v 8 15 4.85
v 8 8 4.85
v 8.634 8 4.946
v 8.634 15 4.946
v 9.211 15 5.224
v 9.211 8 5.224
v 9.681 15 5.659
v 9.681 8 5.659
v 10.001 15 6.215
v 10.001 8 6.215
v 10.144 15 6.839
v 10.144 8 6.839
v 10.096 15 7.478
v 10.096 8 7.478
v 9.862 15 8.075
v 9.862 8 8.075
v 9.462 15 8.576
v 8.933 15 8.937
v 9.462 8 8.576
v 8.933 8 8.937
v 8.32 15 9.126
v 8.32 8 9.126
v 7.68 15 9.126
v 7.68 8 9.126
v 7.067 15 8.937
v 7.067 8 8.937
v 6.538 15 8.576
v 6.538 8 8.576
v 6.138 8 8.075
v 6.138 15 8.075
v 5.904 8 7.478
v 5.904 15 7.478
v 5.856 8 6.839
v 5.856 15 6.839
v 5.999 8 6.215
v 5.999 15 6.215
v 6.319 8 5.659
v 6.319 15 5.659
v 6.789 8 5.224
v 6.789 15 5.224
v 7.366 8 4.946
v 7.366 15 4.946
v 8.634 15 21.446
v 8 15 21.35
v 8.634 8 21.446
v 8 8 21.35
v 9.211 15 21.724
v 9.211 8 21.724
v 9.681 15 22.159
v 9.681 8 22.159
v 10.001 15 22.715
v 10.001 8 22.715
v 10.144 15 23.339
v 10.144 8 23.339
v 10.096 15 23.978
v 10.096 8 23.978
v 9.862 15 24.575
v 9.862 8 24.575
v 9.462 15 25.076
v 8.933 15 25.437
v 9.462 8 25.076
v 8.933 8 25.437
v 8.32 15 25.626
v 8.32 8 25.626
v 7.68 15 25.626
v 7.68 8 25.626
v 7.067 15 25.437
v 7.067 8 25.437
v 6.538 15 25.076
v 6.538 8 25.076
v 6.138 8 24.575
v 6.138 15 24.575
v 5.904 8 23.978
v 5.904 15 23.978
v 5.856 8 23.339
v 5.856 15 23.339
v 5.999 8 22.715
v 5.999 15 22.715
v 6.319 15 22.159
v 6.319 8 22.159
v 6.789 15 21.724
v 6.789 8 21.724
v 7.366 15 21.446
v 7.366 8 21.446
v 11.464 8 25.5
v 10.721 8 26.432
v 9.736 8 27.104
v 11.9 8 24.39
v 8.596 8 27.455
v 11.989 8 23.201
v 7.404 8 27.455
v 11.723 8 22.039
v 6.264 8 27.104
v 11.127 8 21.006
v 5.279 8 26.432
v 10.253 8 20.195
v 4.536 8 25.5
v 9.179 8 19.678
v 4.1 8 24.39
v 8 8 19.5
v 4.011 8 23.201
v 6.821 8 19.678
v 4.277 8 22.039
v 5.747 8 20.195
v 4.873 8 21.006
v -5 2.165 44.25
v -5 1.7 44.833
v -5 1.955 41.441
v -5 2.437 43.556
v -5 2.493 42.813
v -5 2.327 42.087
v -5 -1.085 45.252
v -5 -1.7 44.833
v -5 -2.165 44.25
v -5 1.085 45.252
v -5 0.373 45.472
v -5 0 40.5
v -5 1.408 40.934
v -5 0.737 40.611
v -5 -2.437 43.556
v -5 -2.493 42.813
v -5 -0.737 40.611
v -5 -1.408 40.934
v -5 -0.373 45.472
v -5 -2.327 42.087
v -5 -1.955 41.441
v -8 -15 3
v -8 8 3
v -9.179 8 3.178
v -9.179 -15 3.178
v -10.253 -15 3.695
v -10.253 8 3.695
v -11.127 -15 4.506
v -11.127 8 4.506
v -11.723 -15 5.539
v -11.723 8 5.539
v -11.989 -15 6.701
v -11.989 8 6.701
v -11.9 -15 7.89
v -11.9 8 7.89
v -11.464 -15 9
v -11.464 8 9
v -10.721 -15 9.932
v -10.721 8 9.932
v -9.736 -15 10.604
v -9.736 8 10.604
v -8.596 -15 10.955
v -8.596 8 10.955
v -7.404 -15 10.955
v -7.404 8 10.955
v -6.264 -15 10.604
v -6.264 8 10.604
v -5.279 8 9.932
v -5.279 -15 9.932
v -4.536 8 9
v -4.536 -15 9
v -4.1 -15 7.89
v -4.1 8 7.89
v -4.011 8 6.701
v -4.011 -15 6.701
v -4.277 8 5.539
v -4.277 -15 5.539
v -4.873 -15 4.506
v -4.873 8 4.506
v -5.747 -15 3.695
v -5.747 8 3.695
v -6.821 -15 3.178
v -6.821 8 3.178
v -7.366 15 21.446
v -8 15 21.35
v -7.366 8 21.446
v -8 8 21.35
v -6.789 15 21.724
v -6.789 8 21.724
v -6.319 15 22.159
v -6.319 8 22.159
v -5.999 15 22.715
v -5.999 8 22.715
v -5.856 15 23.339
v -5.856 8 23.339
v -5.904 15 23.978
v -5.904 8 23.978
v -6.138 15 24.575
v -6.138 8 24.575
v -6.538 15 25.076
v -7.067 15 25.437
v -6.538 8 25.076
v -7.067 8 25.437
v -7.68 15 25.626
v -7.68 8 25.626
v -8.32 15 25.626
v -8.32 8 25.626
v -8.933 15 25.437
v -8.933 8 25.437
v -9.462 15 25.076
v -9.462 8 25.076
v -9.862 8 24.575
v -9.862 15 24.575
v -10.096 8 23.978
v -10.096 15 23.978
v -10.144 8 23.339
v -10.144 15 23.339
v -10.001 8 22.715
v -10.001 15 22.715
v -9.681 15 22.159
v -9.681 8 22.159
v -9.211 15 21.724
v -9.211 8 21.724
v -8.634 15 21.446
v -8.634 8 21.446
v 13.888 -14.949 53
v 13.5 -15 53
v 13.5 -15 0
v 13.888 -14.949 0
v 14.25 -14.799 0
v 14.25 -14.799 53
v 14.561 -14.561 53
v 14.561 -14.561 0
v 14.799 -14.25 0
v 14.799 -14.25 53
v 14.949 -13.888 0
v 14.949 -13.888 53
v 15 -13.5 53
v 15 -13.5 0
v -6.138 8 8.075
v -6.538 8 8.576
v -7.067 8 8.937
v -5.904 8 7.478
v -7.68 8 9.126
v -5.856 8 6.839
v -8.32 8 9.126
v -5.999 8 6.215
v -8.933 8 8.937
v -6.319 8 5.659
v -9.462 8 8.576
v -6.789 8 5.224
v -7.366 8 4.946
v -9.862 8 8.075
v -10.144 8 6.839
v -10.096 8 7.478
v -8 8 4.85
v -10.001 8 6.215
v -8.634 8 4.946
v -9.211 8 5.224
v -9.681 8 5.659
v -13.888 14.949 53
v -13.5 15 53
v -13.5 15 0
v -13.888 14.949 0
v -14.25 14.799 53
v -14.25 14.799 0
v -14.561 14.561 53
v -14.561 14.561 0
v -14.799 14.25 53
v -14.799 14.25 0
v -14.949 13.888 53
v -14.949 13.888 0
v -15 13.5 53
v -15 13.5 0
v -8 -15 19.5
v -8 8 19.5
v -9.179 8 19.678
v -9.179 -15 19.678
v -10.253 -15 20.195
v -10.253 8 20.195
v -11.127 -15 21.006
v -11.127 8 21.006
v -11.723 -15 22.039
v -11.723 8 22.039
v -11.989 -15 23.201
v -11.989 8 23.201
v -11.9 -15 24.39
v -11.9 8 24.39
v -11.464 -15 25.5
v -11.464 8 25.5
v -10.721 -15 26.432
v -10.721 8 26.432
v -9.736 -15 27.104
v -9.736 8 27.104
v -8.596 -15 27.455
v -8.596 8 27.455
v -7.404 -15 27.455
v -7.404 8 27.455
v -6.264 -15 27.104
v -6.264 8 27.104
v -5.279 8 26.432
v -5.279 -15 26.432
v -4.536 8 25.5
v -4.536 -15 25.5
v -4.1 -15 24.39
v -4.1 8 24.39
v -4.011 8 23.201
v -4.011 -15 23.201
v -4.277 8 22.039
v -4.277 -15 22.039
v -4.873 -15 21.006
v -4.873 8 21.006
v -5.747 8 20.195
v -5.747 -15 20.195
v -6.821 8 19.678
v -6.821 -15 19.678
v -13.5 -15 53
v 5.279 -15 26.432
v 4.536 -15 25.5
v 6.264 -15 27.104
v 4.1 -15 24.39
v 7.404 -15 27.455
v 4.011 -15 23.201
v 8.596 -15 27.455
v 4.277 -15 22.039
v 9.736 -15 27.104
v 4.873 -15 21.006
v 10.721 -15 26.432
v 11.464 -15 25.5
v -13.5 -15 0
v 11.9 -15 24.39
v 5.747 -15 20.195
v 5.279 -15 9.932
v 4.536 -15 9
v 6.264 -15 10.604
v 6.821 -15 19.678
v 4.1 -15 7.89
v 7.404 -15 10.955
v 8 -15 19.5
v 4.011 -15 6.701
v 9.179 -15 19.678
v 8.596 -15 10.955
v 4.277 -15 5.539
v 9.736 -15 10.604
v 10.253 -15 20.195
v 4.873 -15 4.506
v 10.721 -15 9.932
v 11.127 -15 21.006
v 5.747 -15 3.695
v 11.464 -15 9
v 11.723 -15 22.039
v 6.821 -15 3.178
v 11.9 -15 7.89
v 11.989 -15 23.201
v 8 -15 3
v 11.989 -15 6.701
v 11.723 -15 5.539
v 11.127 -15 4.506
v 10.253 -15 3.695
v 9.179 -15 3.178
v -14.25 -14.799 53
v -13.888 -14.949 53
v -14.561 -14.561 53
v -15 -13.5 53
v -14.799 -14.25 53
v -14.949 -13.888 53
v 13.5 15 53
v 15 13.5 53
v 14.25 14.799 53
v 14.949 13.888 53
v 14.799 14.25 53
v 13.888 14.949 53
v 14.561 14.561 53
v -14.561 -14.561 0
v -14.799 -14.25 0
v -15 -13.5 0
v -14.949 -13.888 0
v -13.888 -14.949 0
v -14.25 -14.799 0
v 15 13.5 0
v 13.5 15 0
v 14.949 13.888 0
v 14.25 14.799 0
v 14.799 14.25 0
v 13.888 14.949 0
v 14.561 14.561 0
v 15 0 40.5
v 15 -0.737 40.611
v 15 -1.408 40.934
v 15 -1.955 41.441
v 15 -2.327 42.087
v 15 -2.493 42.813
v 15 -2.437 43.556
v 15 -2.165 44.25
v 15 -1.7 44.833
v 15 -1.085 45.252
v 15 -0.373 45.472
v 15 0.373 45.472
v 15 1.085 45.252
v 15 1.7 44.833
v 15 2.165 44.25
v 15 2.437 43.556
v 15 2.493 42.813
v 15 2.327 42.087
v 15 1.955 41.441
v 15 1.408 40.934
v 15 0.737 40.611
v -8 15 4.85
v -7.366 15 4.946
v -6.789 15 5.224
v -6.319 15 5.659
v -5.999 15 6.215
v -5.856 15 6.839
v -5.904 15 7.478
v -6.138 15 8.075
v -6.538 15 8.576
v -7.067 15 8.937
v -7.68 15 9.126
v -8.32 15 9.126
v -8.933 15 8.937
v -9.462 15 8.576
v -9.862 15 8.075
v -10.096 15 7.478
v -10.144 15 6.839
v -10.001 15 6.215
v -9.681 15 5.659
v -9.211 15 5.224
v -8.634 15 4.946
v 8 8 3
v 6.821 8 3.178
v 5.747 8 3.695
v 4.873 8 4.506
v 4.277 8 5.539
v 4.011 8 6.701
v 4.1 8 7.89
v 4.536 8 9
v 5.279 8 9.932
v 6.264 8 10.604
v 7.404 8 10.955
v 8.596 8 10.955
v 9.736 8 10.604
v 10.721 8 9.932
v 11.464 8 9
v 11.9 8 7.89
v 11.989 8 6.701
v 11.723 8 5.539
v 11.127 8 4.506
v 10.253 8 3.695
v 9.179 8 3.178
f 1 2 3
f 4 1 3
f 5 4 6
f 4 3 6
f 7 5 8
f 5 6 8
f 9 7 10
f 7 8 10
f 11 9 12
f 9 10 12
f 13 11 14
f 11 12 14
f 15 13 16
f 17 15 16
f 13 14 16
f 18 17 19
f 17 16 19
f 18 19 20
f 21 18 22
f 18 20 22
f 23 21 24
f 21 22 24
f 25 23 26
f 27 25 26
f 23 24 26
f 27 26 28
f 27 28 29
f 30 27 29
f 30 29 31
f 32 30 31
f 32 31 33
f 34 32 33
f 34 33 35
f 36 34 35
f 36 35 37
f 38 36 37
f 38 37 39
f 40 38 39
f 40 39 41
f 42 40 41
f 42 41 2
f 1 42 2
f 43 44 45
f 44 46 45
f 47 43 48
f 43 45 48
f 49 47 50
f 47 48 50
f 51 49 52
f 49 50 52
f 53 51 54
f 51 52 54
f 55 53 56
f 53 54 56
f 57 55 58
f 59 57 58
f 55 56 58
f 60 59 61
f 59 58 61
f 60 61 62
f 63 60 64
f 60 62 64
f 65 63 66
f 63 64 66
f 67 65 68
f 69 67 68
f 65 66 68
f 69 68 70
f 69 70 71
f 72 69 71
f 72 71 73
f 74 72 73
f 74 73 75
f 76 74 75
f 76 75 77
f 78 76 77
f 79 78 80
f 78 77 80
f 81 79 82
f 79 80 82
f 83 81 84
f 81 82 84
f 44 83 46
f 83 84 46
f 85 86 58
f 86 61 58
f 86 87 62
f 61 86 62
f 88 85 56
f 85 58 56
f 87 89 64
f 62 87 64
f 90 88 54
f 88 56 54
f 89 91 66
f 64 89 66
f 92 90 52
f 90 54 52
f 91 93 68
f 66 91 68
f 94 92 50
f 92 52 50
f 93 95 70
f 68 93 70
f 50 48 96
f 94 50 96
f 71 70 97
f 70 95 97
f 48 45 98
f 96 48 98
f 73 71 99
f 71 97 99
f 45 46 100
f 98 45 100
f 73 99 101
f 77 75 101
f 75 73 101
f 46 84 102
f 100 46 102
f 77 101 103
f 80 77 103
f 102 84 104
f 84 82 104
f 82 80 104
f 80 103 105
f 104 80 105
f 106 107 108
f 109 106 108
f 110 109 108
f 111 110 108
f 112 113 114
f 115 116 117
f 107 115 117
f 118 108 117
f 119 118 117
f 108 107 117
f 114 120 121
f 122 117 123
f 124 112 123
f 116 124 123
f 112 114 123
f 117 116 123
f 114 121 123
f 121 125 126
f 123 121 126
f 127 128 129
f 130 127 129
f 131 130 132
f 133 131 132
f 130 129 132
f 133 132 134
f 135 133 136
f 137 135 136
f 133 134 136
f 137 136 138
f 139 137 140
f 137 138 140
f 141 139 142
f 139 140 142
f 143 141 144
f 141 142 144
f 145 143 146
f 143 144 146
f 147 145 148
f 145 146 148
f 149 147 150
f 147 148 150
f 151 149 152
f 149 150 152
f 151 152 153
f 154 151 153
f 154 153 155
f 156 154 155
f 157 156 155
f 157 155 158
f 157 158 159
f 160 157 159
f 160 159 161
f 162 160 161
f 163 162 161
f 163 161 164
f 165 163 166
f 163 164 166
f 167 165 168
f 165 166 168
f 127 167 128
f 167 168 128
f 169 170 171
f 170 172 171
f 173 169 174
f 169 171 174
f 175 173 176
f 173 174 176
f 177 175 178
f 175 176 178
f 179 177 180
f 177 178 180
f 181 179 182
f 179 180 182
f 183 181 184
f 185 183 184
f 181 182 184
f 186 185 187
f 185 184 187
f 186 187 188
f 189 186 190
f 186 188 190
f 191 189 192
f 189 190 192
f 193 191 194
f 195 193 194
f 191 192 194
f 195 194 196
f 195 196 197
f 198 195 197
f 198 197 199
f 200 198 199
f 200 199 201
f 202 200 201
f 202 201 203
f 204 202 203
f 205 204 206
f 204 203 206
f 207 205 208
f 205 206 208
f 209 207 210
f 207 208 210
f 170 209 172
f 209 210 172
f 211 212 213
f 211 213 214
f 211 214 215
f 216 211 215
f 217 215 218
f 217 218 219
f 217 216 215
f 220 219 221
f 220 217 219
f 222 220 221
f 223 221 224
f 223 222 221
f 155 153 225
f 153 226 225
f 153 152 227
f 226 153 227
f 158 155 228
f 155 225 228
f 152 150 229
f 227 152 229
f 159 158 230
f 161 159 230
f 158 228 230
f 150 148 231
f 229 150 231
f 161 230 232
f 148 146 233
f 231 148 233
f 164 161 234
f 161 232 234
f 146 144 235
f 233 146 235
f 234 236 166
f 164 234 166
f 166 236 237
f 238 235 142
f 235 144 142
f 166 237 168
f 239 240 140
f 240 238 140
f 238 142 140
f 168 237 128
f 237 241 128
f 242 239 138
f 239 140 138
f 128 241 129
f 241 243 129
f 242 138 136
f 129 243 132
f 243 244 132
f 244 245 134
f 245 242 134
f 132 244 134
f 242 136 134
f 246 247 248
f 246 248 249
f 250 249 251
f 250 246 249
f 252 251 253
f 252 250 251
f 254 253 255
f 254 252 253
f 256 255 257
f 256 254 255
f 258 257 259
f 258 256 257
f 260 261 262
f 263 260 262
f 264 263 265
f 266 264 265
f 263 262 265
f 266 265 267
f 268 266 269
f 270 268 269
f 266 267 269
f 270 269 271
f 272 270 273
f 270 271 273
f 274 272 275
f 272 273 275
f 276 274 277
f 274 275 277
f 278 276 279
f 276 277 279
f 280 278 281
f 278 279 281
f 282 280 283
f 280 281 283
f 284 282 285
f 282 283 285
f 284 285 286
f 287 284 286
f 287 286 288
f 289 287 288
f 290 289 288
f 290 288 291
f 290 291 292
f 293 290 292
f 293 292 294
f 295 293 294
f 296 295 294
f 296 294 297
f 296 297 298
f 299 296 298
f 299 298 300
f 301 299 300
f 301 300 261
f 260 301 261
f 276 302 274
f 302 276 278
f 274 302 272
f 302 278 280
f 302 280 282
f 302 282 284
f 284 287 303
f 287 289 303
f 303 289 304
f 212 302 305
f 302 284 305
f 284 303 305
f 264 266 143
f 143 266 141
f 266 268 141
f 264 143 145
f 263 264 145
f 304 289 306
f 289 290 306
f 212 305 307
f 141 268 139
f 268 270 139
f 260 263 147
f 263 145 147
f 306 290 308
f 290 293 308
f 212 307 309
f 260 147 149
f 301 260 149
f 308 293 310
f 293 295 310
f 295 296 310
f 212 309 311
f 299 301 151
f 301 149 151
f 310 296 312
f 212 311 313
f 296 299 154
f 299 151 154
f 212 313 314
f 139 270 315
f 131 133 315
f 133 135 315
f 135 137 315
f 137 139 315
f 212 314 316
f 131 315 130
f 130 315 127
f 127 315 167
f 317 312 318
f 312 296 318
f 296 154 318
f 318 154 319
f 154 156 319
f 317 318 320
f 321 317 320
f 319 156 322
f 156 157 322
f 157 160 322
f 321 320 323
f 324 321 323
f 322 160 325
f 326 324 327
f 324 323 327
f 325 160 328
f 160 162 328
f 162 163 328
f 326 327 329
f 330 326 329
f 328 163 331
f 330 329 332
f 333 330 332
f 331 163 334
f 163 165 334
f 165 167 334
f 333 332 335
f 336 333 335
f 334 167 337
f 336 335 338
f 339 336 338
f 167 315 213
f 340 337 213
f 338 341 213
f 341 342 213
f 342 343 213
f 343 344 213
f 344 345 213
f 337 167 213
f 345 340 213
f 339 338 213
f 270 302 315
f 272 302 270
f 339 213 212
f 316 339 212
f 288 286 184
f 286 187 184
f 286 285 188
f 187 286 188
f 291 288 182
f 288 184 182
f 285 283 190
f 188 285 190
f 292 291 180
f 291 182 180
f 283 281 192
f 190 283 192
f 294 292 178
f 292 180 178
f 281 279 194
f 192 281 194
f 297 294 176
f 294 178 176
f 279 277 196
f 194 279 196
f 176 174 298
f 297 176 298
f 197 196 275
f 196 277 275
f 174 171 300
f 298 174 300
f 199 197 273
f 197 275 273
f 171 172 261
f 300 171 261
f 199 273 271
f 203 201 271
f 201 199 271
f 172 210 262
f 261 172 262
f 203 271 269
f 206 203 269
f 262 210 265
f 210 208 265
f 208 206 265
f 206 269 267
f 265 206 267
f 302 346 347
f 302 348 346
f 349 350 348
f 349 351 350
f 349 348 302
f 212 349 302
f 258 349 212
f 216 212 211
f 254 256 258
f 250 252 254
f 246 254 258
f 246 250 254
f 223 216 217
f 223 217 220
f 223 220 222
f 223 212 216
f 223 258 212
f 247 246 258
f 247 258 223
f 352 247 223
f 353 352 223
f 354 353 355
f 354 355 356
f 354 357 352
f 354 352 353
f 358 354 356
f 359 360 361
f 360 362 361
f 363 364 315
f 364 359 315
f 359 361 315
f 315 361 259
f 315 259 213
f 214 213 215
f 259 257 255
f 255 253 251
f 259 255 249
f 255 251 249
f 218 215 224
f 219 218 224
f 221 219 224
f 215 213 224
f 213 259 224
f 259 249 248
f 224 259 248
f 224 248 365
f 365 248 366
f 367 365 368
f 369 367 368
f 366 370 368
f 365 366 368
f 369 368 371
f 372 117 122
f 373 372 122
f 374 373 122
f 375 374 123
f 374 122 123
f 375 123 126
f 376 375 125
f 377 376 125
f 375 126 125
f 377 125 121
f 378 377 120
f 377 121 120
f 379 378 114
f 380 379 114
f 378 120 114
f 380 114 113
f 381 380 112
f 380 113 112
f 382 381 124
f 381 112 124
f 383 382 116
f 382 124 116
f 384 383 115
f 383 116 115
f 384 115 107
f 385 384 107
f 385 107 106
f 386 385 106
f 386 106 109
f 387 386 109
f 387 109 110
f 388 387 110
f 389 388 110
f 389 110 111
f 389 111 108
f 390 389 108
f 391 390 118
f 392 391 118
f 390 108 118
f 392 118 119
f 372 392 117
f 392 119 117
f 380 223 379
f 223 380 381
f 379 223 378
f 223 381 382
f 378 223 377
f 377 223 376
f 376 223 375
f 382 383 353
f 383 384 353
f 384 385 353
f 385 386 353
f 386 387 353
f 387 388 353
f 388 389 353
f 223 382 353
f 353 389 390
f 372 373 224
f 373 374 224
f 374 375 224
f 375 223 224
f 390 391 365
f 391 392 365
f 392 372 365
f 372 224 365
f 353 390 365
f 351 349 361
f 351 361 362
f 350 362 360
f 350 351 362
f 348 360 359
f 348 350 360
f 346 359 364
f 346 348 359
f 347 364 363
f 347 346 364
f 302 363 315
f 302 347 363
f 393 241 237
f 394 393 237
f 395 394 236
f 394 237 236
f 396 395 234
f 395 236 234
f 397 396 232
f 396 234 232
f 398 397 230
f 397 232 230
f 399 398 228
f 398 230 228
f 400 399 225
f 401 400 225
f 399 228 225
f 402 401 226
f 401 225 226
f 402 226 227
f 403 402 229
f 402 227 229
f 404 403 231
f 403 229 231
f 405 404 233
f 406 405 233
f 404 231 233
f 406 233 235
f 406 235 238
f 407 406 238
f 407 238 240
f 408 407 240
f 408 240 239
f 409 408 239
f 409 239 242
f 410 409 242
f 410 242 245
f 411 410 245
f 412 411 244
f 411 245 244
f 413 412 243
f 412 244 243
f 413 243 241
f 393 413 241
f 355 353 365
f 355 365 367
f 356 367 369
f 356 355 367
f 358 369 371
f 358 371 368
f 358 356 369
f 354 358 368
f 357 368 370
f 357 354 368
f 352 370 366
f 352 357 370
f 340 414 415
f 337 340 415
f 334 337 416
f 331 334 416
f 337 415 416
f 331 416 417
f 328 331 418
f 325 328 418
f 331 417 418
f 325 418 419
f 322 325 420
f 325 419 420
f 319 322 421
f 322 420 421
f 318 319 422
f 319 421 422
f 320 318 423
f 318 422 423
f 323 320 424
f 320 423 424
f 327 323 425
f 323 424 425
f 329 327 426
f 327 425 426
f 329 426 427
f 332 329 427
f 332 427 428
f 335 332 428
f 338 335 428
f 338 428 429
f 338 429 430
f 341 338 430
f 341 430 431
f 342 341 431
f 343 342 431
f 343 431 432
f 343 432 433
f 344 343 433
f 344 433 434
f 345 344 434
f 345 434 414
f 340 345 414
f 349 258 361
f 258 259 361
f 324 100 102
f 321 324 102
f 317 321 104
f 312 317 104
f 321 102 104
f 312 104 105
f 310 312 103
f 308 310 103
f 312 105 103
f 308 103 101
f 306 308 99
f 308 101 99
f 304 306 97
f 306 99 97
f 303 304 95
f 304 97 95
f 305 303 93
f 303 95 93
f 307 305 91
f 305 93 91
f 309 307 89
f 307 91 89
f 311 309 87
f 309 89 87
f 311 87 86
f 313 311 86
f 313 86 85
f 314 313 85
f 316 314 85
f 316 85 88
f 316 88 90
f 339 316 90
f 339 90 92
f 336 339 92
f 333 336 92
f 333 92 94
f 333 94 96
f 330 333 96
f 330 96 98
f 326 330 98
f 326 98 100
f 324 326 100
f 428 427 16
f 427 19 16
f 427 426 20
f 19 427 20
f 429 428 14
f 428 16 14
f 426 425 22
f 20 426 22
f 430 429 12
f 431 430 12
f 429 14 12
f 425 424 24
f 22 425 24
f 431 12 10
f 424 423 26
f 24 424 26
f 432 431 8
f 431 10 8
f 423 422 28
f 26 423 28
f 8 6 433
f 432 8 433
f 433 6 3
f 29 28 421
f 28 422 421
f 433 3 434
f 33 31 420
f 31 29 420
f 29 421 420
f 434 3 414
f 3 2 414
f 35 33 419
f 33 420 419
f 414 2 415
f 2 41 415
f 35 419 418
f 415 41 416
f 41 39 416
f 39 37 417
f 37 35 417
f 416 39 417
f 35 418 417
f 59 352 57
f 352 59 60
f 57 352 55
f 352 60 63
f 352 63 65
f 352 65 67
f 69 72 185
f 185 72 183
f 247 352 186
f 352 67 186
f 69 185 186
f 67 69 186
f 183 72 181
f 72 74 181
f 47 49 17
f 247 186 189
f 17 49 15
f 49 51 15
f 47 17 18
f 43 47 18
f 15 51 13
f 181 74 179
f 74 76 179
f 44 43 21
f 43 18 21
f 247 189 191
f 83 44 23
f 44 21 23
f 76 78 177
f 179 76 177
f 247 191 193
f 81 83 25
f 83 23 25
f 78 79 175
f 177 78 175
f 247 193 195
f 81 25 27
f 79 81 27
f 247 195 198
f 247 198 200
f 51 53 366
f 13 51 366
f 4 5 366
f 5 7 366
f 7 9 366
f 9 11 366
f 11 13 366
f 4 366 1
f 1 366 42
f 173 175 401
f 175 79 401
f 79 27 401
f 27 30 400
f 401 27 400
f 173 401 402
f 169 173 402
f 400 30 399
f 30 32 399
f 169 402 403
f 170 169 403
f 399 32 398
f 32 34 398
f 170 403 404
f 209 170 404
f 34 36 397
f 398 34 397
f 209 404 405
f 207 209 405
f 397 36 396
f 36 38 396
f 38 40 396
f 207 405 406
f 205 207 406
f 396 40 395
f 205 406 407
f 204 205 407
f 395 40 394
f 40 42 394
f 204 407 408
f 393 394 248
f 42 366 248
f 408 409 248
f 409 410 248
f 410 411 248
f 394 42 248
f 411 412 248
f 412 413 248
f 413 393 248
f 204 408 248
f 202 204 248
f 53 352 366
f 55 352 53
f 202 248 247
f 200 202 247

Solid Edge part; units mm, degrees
sketch "Sketch1" plane through (0, 0, 0) normal (0, 0, 1) x (1, 0, 0)
  line L0 (-15, -15) -> (15, -15)
  line L1 (15, -15) -> (15, 15)
  line L2 (15, 15) -> (-15, 15)
  line L3 (-15, 15) -> (-15, -15)
extrude "Protrusion1" add sketch "Sketch1" along normal blind 53
hole "Hole_1" at (-8, -15, 23.5) direction (0, 1, 0) diameter 4.3 end up to next counterbore diameter 8 counterbore depth 23
hole "Hole1" at (8, -15, 23.5) direction (0, 1, 0) diameter 4.3 end up to next counterbore diameter 8 counterbore depth 23
hole "Hole2" at (8, -15, 7) direction (0, 1, 0) diameter 4.3 end up to next counterbore diameter 8 counterbore depth 23
hole "Hole3" at (-8, -15, 7) direction (0, 1, 0) diameter 4.3 end up to next counterbore diameter 8 counterbore depth 23
hole "Hole_5" at (15, 0, 43) direction (-1, 0, 0) diameter 5 depth 20
fillet "Round_1" radius 1.5 4 edges at (-15, -15, 26.5) (15, -15, 26.5) (-15, 15, 26.5) (15, 15, 26.5)
properties material "POM"
